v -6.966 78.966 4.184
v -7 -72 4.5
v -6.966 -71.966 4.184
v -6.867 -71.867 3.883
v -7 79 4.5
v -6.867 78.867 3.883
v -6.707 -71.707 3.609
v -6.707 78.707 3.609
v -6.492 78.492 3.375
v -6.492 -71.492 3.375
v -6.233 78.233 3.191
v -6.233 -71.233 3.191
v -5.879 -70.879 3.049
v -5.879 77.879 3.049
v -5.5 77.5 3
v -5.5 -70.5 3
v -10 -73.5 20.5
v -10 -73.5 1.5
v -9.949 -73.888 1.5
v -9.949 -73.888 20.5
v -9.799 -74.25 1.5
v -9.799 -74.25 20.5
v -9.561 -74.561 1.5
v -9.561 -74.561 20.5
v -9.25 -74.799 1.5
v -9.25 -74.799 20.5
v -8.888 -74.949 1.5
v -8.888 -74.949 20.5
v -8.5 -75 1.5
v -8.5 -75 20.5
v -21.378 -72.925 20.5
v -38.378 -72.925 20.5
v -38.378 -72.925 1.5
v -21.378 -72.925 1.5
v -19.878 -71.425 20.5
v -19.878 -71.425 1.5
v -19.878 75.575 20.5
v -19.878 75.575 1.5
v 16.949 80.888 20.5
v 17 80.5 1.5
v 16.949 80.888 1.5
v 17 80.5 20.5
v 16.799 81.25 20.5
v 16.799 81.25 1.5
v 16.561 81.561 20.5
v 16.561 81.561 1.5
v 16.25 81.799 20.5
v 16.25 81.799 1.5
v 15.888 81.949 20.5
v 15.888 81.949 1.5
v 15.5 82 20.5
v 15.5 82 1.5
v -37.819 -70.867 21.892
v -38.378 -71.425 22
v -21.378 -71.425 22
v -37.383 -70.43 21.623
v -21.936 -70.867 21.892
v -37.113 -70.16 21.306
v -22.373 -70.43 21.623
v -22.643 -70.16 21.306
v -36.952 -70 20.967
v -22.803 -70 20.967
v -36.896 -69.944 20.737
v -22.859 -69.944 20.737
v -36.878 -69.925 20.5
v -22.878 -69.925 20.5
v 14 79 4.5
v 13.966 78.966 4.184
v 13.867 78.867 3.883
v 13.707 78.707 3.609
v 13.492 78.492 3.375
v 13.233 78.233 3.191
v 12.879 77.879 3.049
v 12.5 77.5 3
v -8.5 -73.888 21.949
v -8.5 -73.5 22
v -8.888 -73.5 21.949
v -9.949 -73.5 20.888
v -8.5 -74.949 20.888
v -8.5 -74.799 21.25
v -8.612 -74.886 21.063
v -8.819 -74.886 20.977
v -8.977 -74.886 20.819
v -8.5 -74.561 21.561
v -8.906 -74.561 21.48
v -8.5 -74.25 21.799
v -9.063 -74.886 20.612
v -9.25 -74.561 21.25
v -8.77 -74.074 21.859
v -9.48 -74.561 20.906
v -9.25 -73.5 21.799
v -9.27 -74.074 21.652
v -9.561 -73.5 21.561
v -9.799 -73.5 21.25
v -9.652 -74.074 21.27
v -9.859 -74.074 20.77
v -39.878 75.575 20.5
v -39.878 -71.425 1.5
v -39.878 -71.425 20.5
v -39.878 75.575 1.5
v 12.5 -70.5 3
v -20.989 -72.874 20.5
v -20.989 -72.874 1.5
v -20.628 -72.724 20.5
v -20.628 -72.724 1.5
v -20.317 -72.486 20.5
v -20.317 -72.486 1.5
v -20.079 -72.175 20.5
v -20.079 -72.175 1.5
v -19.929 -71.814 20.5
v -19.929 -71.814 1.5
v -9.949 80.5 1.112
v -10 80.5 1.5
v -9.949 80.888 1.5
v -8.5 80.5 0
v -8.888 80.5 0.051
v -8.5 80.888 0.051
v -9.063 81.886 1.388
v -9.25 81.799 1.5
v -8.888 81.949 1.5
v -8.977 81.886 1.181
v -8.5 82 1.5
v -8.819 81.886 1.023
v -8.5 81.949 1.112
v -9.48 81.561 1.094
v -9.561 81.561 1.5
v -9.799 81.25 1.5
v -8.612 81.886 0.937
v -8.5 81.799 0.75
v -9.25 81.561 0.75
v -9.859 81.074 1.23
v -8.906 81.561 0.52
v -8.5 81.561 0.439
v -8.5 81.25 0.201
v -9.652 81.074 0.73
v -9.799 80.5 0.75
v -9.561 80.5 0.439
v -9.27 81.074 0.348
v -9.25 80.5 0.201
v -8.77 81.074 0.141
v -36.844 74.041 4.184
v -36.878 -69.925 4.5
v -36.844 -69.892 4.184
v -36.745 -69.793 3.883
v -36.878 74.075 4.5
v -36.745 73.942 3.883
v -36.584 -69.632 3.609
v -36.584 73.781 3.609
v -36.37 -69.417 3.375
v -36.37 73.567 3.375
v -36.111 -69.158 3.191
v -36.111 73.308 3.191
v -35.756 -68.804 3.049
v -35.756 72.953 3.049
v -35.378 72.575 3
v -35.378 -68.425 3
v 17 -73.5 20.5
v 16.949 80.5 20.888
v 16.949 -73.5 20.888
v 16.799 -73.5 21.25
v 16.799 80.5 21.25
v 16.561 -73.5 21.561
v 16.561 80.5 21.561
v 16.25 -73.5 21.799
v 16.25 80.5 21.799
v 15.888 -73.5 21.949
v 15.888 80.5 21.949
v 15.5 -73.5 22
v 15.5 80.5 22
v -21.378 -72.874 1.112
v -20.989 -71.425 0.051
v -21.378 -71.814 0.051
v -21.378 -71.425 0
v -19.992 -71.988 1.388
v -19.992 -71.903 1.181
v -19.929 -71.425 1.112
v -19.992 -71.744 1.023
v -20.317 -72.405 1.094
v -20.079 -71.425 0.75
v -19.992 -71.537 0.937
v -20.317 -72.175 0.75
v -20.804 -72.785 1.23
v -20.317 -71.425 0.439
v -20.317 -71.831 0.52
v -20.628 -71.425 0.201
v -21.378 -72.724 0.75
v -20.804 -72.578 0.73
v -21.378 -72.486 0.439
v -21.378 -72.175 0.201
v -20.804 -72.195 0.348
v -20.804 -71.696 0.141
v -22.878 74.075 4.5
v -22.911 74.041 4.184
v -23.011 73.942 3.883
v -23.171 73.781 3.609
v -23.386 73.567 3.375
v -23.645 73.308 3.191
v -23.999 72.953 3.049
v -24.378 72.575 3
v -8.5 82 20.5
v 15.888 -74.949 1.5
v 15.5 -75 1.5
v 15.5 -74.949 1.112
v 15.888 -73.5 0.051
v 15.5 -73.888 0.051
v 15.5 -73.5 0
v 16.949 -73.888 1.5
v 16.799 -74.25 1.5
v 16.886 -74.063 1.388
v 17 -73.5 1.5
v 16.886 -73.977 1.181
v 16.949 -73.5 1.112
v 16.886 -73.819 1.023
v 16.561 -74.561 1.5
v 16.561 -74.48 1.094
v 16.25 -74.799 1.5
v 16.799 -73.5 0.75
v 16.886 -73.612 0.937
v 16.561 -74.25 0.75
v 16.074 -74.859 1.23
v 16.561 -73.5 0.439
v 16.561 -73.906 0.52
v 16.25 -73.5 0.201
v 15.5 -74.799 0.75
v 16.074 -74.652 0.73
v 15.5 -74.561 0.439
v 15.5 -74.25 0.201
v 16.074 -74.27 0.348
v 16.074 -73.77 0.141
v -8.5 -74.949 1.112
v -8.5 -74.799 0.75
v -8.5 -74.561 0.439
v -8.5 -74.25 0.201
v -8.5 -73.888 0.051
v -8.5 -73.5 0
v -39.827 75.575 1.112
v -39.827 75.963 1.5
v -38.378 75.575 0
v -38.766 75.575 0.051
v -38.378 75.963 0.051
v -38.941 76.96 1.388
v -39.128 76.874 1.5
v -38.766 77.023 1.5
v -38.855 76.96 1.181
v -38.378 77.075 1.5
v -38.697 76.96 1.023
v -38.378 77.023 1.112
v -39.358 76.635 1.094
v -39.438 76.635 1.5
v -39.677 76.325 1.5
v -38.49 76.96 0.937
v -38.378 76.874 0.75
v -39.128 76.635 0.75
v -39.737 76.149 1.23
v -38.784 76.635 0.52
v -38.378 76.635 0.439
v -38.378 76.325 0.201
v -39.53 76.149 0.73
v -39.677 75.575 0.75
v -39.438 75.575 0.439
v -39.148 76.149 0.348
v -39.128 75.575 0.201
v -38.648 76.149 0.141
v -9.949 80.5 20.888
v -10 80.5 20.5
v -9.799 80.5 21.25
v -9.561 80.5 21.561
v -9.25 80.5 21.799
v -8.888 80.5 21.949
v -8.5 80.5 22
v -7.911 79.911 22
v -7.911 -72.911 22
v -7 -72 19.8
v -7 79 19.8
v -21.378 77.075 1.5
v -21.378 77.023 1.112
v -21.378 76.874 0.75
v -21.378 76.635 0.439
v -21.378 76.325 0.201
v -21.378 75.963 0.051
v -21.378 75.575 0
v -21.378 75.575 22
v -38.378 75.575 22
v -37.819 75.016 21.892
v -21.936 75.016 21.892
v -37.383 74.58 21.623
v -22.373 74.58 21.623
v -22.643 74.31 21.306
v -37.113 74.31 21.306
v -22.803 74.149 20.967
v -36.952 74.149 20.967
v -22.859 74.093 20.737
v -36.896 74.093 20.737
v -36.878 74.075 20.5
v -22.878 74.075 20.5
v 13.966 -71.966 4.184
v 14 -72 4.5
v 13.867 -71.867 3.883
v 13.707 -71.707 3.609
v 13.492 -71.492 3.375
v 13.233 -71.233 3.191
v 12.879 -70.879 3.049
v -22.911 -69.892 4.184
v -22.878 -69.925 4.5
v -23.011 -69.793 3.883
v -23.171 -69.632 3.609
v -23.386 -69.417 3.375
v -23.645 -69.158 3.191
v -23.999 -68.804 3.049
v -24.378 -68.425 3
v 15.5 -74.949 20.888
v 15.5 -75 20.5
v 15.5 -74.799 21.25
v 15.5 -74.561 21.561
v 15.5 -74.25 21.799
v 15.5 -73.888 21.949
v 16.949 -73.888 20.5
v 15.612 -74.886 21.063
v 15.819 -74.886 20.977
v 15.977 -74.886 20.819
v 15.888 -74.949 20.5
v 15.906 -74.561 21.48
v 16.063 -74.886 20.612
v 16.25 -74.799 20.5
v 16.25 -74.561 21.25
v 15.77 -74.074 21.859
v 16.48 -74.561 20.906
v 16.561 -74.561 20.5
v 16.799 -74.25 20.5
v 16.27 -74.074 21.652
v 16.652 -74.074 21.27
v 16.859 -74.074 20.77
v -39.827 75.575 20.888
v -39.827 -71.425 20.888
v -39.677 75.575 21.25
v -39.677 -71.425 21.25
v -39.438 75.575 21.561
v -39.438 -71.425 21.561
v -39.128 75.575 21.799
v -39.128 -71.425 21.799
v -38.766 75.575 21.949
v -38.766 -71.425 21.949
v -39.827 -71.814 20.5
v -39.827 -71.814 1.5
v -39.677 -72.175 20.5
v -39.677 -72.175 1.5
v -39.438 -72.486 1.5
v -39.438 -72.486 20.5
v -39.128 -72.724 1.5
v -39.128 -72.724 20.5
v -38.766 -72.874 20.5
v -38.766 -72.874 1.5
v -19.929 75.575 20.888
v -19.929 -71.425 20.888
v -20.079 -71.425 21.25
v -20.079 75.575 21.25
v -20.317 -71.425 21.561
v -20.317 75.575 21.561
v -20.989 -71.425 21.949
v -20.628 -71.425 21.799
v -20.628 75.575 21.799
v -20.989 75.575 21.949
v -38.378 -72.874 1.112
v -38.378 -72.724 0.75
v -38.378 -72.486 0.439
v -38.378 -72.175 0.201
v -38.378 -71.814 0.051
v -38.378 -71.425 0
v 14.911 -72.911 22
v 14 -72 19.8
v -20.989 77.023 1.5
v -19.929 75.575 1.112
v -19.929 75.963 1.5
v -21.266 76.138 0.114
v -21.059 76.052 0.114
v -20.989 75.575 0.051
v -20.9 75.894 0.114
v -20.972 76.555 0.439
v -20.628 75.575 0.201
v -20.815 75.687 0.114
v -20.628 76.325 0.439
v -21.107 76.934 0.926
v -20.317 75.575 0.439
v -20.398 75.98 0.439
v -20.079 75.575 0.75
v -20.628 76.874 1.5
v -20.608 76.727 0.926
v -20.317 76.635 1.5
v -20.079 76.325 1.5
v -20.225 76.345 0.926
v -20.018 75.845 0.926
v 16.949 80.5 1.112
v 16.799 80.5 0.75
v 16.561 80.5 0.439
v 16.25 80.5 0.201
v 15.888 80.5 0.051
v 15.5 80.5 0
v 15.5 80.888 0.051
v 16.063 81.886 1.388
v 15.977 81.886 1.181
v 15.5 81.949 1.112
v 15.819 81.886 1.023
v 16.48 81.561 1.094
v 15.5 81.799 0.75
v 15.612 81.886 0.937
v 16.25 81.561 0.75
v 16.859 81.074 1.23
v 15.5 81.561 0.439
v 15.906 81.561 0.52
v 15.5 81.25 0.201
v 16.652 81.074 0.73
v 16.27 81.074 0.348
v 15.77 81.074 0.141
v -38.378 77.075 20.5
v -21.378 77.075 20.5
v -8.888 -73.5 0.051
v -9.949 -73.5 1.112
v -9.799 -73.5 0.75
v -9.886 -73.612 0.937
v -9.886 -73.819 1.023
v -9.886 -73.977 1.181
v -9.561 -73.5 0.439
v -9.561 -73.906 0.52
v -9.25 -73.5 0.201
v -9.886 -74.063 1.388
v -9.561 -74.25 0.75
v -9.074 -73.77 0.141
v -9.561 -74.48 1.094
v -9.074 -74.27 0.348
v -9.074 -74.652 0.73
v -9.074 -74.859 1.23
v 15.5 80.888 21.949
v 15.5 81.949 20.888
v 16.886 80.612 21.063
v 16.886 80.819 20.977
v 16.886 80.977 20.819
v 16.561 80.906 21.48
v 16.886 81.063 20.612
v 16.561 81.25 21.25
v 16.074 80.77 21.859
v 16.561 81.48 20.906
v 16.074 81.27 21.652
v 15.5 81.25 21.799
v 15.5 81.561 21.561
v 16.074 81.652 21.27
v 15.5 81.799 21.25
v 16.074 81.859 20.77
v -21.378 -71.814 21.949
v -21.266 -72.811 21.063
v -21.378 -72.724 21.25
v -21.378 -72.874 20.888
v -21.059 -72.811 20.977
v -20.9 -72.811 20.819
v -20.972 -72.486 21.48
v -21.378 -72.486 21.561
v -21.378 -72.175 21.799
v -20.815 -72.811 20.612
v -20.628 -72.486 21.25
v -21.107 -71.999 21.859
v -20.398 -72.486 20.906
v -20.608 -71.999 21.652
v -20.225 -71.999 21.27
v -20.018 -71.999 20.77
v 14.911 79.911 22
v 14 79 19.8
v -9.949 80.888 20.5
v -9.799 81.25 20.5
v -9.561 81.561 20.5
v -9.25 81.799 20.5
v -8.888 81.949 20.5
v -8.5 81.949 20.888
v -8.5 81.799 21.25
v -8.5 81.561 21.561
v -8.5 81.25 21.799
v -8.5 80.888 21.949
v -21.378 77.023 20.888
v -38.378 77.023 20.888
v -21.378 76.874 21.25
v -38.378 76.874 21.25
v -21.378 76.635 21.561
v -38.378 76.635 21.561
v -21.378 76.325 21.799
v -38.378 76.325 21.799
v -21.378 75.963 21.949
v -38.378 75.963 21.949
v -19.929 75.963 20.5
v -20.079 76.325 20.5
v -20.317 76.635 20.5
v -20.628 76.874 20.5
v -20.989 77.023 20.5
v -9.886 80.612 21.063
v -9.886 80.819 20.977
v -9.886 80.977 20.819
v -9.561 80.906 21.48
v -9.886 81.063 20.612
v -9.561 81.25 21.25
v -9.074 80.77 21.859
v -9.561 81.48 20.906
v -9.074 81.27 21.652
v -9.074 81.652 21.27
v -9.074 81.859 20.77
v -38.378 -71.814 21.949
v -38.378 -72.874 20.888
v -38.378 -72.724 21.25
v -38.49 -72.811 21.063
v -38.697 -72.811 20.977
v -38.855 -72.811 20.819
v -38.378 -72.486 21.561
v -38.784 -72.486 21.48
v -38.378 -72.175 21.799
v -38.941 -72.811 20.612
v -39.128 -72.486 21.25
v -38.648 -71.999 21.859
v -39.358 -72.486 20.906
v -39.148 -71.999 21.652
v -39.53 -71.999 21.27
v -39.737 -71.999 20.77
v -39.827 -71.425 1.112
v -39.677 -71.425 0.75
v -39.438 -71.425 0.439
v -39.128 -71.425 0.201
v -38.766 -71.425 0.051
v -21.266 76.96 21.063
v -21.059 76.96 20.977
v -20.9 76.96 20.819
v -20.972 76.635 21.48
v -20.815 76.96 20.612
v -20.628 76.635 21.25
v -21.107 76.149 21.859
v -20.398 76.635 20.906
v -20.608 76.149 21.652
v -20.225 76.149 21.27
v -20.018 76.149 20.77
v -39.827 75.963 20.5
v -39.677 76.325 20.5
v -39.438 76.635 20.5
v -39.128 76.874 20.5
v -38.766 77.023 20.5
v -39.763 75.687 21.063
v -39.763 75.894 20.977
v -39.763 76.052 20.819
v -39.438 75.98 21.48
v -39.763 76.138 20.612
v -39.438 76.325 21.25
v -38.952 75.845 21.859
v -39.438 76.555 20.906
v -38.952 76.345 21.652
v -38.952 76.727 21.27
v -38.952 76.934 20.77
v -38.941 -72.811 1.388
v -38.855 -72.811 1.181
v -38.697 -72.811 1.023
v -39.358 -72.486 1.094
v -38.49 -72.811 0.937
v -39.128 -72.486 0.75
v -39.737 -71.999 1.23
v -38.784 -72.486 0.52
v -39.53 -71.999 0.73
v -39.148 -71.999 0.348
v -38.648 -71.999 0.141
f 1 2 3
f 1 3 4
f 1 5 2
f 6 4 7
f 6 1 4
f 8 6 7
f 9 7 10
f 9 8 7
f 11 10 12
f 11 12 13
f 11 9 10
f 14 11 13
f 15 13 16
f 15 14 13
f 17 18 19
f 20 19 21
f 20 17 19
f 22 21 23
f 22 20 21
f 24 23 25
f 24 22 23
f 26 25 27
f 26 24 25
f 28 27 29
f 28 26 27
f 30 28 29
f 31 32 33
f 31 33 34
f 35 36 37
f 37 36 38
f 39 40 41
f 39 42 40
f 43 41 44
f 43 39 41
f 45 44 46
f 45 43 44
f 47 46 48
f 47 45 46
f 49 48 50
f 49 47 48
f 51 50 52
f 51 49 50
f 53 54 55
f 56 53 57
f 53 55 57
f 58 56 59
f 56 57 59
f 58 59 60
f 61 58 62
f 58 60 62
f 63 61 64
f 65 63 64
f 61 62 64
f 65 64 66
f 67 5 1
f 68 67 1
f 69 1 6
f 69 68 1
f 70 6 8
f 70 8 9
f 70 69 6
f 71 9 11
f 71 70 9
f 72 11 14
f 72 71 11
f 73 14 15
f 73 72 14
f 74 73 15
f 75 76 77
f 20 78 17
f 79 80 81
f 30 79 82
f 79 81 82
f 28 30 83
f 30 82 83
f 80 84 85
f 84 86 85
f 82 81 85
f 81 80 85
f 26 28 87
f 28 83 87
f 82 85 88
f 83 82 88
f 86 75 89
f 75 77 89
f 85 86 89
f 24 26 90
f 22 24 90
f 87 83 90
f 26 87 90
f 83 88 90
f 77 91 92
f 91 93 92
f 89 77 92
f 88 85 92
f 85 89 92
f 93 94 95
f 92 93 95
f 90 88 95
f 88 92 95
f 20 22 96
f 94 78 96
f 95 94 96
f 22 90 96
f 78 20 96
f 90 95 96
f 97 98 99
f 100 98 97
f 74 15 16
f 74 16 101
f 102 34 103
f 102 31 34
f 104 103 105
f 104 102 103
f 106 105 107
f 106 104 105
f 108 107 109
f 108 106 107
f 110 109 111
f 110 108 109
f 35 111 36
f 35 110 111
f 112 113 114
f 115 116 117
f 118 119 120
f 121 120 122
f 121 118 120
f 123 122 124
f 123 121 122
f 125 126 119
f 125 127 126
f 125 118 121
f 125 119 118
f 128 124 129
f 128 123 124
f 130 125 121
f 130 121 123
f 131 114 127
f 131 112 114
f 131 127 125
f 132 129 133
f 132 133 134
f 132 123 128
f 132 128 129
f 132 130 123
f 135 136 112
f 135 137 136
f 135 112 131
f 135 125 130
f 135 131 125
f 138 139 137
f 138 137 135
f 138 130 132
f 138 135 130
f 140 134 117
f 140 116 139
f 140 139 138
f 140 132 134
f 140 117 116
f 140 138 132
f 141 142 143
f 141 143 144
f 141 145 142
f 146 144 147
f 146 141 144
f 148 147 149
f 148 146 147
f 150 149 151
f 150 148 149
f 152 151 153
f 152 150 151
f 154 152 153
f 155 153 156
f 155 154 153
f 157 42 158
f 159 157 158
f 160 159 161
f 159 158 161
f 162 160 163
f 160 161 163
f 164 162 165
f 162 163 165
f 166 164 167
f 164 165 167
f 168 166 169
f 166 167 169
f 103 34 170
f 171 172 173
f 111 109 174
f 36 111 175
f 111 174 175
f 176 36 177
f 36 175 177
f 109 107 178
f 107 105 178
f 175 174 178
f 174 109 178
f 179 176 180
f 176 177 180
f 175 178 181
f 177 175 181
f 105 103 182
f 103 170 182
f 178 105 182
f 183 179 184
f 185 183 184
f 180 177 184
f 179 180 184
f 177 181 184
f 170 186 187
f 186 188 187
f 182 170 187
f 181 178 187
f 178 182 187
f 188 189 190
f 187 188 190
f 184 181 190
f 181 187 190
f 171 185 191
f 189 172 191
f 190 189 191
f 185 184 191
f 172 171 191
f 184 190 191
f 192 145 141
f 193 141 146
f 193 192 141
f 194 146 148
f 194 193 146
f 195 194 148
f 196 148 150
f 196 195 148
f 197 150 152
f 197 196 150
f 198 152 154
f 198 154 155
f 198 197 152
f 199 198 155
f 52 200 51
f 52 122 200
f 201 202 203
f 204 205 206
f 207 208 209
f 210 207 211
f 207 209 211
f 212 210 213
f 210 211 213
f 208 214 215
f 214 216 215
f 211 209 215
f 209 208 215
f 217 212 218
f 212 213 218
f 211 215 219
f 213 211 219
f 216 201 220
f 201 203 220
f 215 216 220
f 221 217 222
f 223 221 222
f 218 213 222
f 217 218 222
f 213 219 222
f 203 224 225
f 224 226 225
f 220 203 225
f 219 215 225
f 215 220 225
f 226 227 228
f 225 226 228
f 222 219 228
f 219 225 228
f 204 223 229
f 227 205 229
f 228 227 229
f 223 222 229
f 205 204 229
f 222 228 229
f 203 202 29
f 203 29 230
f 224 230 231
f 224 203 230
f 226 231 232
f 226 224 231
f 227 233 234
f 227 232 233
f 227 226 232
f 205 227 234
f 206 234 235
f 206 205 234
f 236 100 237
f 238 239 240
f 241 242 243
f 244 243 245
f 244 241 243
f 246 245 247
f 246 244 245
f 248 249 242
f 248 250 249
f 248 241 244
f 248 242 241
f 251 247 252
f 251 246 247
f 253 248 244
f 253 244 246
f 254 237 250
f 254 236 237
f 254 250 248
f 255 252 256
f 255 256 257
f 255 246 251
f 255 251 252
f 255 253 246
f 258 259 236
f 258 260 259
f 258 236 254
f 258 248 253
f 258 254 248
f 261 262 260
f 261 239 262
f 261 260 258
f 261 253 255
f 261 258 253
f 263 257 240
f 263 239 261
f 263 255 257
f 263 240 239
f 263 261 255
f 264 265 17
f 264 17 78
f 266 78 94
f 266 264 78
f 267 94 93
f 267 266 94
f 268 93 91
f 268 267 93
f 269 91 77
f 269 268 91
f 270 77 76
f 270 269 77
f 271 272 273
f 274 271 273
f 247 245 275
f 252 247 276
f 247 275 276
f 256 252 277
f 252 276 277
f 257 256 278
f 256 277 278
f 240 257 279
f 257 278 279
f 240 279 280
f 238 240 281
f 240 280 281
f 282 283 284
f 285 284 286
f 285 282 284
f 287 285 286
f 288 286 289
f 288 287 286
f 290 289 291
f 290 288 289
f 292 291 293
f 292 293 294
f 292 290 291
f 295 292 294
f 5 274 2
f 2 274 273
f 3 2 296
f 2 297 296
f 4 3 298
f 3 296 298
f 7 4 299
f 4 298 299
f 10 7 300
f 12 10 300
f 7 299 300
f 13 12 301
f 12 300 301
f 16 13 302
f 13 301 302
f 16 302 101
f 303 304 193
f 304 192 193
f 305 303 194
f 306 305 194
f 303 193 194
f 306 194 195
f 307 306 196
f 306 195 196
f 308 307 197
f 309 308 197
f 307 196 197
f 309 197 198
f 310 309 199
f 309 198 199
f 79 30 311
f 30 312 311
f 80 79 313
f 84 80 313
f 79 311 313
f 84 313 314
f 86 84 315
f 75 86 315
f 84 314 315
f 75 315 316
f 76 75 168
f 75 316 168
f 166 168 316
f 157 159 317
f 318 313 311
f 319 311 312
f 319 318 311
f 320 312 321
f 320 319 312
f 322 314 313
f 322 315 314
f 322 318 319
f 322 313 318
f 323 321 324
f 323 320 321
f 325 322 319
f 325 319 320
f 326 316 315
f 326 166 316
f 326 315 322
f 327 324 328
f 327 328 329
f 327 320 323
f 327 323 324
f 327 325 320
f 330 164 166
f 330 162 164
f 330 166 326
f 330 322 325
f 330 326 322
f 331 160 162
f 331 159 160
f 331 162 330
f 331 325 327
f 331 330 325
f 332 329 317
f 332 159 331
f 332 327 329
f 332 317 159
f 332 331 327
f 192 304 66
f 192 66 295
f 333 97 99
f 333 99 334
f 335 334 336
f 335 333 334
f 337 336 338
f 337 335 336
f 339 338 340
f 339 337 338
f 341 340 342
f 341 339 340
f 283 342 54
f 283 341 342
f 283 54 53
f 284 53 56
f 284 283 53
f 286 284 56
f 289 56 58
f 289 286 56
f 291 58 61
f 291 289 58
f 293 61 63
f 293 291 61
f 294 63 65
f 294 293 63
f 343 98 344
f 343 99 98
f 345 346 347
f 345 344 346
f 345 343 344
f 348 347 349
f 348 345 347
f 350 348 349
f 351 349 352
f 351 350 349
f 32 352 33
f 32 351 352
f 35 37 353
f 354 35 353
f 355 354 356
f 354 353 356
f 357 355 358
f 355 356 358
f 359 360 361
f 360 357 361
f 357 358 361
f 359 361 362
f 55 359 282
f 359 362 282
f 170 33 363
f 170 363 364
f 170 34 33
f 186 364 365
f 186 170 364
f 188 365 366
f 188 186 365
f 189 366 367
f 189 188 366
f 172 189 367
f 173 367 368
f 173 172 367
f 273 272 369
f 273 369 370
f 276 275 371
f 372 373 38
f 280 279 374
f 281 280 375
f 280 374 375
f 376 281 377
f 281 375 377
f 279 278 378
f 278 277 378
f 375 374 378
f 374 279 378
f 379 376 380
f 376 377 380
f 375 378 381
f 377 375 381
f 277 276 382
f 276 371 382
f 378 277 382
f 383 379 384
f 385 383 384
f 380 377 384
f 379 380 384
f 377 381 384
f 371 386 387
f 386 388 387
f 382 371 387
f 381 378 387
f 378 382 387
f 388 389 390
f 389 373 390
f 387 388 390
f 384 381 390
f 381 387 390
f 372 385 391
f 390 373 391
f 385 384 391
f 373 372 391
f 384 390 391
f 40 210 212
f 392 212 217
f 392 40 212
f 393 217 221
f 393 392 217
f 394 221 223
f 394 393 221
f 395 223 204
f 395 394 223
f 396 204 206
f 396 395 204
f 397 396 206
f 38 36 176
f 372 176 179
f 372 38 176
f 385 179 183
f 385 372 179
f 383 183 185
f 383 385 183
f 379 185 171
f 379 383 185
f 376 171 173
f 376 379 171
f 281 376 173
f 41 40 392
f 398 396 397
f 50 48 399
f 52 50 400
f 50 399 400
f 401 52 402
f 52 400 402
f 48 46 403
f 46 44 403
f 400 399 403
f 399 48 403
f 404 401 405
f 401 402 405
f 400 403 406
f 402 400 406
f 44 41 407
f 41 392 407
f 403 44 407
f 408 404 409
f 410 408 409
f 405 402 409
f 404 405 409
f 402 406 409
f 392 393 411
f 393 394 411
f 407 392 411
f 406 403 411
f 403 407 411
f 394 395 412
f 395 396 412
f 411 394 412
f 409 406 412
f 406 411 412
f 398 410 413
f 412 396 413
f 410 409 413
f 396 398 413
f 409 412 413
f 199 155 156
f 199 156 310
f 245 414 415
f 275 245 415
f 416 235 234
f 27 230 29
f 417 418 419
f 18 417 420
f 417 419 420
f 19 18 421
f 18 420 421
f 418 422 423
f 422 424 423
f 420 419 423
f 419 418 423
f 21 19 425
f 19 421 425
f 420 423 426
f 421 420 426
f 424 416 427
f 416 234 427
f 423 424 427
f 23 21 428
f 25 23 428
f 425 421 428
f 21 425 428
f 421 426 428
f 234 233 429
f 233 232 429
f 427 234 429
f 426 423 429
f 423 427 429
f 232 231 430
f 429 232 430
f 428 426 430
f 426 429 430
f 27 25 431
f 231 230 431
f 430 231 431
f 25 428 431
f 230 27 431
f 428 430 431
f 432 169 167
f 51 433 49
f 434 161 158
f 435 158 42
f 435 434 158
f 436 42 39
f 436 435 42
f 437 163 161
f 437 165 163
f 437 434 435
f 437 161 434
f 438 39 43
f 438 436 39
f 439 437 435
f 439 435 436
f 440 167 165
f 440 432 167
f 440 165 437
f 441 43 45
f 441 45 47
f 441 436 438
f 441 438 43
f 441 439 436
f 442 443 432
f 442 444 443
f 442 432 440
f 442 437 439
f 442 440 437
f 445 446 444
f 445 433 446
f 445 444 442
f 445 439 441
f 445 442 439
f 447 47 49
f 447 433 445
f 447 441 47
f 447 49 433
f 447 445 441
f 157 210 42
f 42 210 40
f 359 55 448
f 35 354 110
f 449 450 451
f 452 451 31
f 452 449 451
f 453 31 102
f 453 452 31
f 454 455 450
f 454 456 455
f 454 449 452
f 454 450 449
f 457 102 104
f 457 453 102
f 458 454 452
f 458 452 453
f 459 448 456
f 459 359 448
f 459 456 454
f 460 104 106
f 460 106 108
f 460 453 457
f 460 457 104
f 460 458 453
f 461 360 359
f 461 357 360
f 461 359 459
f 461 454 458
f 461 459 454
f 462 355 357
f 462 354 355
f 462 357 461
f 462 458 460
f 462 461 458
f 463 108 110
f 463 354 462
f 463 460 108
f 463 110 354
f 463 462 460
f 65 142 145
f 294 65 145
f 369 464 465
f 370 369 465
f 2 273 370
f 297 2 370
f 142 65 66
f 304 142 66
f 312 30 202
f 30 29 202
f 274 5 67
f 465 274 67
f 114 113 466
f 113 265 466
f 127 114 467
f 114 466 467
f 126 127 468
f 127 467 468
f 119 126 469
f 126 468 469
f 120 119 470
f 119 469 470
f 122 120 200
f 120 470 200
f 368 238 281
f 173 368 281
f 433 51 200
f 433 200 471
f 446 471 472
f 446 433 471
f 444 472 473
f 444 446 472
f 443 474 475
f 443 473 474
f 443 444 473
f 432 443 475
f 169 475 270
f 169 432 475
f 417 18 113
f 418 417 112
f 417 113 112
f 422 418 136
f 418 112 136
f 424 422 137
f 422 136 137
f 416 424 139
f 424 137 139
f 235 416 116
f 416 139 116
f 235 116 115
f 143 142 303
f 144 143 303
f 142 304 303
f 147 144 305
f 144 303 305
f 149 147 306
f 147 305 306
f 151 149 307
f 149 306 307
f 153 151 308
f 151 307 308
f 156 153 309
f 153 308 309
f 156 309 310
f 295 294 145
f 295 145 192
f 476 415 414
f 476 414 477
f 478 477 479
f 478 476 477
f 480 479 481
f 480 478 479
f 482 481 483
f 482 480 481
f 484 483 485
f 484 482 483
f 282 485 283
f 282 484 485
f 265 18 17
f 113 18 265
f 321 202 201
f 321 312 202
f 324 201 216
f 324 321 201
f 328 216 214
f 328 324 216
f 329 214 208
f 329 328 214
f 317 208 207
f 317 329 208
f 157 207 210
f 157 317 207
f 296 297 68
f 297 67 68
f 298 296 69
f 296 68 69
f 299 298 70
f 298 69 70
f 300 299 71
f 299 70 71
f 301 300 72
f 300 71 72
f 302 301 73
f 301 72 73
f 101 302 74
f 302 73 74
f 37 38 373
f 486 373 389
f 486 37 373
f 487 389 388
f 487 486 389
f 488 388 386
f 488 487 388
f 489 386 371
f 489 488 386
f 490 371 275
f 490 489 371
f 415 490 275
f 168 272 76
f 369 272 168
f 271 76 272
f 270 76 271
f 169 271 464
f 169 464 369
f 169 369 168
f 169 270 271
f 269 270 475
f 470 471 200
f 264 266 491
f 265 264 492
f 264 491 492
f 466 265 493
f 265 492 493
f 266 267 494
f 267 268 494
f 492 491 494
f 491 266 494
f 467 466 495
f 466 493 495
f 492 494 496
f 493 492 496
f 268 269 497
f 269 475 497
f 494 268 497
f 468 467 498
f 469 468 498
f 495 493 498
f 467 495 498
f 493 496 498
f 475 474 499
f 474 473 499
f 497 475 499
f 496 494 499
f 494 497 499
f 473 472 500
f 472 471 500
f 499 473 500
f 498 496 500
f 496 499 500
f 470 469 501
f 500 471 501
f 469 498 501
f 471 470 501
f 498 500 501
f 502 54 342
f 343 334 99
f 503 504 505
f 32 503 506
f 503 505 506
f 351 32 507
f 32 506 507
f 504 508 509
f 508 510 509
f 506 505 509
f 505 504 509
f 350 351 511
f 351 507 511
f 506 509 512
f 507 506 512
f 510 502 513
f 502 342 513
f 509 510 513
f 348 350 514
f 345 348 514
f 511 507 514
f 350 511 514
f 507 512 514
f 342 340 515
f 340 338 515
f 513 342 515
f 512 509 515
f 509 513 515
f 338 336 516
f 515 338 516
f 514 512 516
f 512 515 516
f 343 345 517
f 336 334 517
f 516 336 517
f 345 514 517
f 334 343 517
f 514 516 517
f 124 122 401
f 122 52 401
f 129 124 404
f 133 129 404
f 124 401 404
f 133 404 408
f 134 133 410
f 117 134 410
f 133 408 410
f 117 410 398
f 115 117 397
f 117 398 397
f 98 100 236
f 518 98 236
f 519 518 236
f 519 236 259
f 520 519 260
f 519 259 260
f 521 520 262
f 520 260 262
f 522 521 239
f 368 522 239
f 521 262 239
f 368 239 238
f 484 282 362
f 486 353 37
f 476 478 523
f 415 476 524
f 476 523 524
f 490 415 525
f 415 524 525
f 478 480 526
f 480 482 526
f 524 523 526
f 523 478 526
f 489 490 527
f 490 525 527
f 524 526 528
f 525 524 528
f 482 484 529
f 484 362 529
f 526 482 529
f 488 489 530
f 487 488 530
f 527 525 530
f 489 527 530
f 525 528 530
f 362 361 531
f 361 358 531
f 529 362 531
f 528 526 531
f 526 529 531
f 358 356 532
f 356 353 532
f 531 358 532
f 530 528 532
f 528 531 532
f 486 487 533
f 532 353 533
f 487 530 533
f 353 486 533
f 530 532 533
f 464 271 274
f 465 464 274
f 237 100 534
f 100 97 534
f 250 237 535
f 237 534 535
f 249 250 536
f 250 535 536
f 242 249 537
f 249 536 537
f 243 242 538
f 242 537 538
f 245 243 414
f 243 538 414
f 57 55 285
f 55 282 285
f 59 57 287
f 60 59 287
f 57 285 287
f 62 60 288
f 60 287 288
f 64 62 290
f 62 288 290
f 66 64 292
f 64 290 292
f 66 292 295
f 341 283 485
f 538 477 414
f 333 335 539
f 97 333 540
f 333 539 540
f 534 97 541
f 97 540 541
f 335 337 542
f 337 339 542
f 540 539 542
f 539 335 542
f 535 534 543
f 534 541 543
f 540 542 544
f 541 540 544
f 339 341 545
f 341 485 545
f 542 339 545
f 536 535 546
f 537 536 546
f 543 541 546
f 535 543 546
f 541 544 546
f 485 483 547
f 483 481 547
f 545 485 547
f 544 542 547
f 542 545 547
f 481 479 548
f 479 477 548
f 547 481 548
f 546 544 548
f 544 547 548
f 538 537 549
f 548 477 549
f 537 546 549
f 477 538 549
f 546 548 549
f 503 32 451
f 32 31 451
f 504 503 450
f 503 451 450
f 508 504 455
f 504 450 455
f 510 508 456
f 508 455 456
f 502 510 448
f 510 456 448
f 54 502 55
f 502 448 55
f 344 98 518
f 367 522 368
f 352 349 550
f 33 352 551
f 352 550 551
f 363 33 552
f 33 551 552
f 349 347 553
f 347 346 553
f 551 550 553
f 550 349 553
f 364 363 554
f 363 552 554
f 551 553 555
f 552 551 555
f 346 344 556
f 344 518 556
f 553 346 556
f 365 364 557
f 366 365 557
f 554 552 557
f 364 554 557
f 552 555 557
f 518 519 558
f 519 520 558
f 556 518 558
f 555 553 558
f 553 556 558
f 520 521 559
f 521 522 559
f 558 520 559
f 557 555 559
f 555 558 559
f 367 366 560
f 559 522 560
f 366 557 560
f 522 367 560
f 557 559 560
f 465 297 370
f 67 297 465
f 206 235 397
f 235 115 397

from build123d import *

# Parameters (mm, degrees)
F0_W          = 20
F0_H          = 150
F1_DEPTH      = 22
F2_T          = -3
F3_W          = 27
F3_H          = 157
F4_DEPTH      = 22
F5_T          = -3
F6_R          = 1.49999
F6_2_R        = 1.49999
F7_SIZE       = 0.9
F8_T4_DEPTH   = 21
F8_T9_DEPTH   = 24.3704715108
F8_T15_DEPTH  = 21
F8_T21_DEPTH  = 21
F8_T26_DEPTH  = 24.3704715108
F8_T32_DEPTH  = 151
F8_T37_DEPTH  = 154.3704715108
F8_T43_DEPTH  = 151
F8_T49_DEPTH  = 151
F8_T54_DEPTH  = 154.3704715108
F8_T60_DEPTH  = 151
F8_T65_DEPTH  = 154.3704715108
F8_T71_DEPTH  = 151
F8_T77_DEPTH  = 151
F8_T82_DEPTH  = 154.3704715108
F8_T88_DEPTH  = 21
F8_T93_DEPTH  = 24.3704715108
F8_T99_DEPTH  = 21
F8_T105_DEPTH = 21
F8_T110_DEPTH = 24.3704715108
F8_T117_DEPTH = 24.3704715108
F8_T122_DEPTH = 154.3704715108
F8_T130_DEPTH = 24.3704715108
F8_T135_DEPTH = 154.3704715108
F8_T143_DEPTH = 154.3704715108
F8_T148_DEPTH = 24.3704715108
F8_T156_DEPTH = 154.3704715108
F8_T161_DEPTH = 24.3704715108


# Not quite as in the source:
# - a fillet or chamfer that OpenCascade refuses, or shapes differently, is made with other operations: its cross-section is extruded or revolved along the edge and cut away or added
# - a fillet or chamfer is up to 0.001 mm smaller than in the source, because OpenCascade refuses the exact size


with BuildPart() as f1:
    # F0 (on Top) → F1 (new body)
    with BuildSketch(Plane.XY):
        with Locations((-29.877627335, 2.0745843649)):
            Rectangle(F0_W, F0_H)
    extrude(amount=F1_DEPTH)

    # F2
    f2_openings = [f1.faces().sort_by_distance(p)[0] for p in [
        (-29.877627, 2.074584, 22),
    ]]
    offset(amount=F2_T, openings=f2_openings)

    # F6 (radius 1.5 in the source; OpenCascade refuses exactly that, so slightly less here)
    f6_edges = [f1.edges().sort_by_distance(p)[0] for p in [
        (-19.877627, 2.074584, 22),
        (-22.877627, 2.074584, 22),
        (-29.877627, 77.074584, 22),
        (-29.877627, 74.074584, 22),
        (-39.877627, 2.074584, 22),
        (-36.877627, 2.074584, 22),
        (-29.877627, -69.925416, 22),
        (-29.877627, -72.925416, 22),
        (-39.877627, 2.074584, 0),
        (-39.877627, -72.925416, 11),
        (-29.877627, -72.925416, 0),
        (-19.877627, -72.925416, 11),
        (-19.877627, 77.074584, 11),
        (-39.877627, 77.074584, 11),
        (-29.877627, 77.074584, 0),
        (-19.877627, 2.074584, 0),
        (-36.877627, 2.074584, 3),
        (-29.877627, -69.925416, 3),
        (-29.877627, 74.074584, 3),
        (-22.877627, 2.074584, 3),
    ]]
    fillet(f6_edges, radius=F6_R)


with BuildPart() as f4:
    # F3 (on Top) → F4 (new body)
    with BuildSketch(Plane.XY):
        with Locations((3.5, 3.5)):
            Rectangle(F3_W, F3_H)
    extrude(amount=F4_DEPTH)

    # F5
    f5_openings = [f4.faces().sort_by_distance(p)[0] for p in [
        (3.5, 3.5, 22),
    ]]
    offset(amount=F5_T, openings=f5_openings)

    # F6#2 (radius 1.5 in the source; OpenCascade refuses exactly that, so slightly less here)
    f6_2_edges = [f4.edges().sort_by_distance(p)[0] for p in [
        (3.5, 82, 22),
        (-10, 3.5, 22),
        (17, 3.5, 22),
        (3.5, -75, 22),
        (3.5, -75, 0),
        (17, -75, 11),
        (17, 3.5, 0),
        (-10, 3.5, 0),
        (-10, -75, 11),
        (-10, 82, 11),
        (17, 82, 11),
        (3.5, 82, 0),
        (3.5, 79, 3),
        (14, 3.5, 3),
        (-7, 3.5, 3),
        (3.5, -72, 3),
    ]]
    fillet(f6_2_edges, radius=F6_2_R)

    # F7
    f7_edges = [f4.edges().sort_by_distance(p)[0] for p in [
        (3.5, 79, 22),
        (-7, 3.5, 22),
        (14, 3.5, 22),
        (3.5, -72, 22),
    ]]
    chamfer(f7_edges, length=F7_SIZE)

    # F8: chamfer of 1.3 on 4 edges, made by hand


with BuildPart() as f8_tool2:
    # F8_s3 → F8_t4 (new body)
    with BuildSketch(Plane.YZ.offset(14)):
        Polygon((79.9192388155, 22.0192388155), (79, 19.8), (79, 21.1), align=None)
    extrude(amount=-F8_T4_DEPTH)

    split(bisect_by=Plane(origin=(-3.55, 0, 3.55), x_dir=(0, 1, 0), z_dir=(0.7071067812, 0, -0.7071067812)), keep=Keep.TOP)


with BuildPart() as f4_1:
    add(f4.part)

    # F8_t1: cut F8_tool2
    add(f8_tool2.part, mode=Mode.SUBTRACT)


with BuildPart() as f8_tool7:
    # F8_s8 → F8_t9 (new body)
    with BuildSketch(Plane.YZ.offset(17.3704715108)):
        Polygon((79.9192388155, 22.0192388155), (79, 19.8), (79, 21.1), align=None)
    extrude(amount=-F8_T9_DEPTH)

    split(bisect_by=Plane(origin=(-3.55, 0, 3.55), x_dir=(0, 1, 0), z_dir=(-0.7071067812, 0, 0.7071067812)), keep=Keep.TOP)

    split(bisect_by=Plane.YZ.offset(14), keep=Keep.TOP)


with BuildPart() as f4_2:
    add(f4_1.part)

    # F8_t6: cut F8_tool7
    add(f8_tool7.part, mode=Mode.SUBTRACT)


with BuildPart() as f8_tool13:
    # F8_s14 → F8_t15 (new body)
    with BuildSketch(Plane.YZ.offset(14)):
        Polygon((79.9192388155, 22.0192388155), (79, 19.8), (79, 21.1), align=None)
    extrude(amount=-F8_T15_DEPTH)

    split(bisect_by=Plane(origin=(-3.55, 0, 3.55), x_dir=(0, 1, 0), z_dir=(-0.7071067812, 0, 0.7071067812)), keep=Keep.TOP)

    split(bisect_by=Plane(origin=(7.05, 0, 7.05), x_dir=(0, 1, 0), z_dir=(0.7071067812, 0, 0.7071067812)), keep=Keep.TOP)


with BuildPart() as f4_3:
    add(f4_2.part)

    # F8_t12: cut F8_tool13
    add(f8_tool13.part, mode=Mode.SUBTRACT)


with BuildPart() as f8_tool19:
    # F8_s20 → F8_t21 (new body)
    with BuildSketch(Plane.YZ.offset(14)):
        Polygon((79.9192388155, 22.0192388155), (79, 19.8), (79, 21.1), align=None)
    extrude(amount=-F8_T21_DEPTH)

    split(bisect_by=Plane(origin=(7.05, 0, 7.05), x_dir=(0, 1, 0), z_dir=(-0.7071067812, 0, -0.7071067812)), keep=Keep.TOP)


with BuildPart() as f4_4:
    add(f4_3.part)

    # F8_t18: cut F8_tool19
    add(f8_tool19.part, mode=Mode.SUBTRACT)


with BuildPart() as f8_tool24:
    # F8_s25 → F8_t26 (new body)
    with BuildSketch(Plane.YZ.offset(14)):
        Polygon((79.9192388155, 22.0192388155), (79, 19.8), (79, 21.1), align=None)
    extrude(amount=-F8_T26_DEPTH)

    split(bisect_by=Plane(origin=(7.05, 0, 7.05), x_dir=(0, 1, 0), z_dir=(0.7071067812, 0, 0.7071067812)), keep=Keep.TOP)

    split(bisect_by=Plane.YZ.offset(-7), keep=Keep.BOTTOM)


with BuildPart() as f4_5:
    add(f4_4.part)

    # F8_t23: cut F8_tool24
    add(f8_tool24.part, mode=Mode.SUBTRACT)


with BuildPart() as f8_tool30:
    # F8_s31 → F8_t32 (new body)
    with BuildSketch(Plane.XZ.offset(-79)):
        Polygon((-7.9192388155, 22.0192388155), (-7, 19.8), (-7, 21.1), align=None)
    extrude(amount=F8_T32_DEPTH)

    split(bisect_by=Plane(origin=(0, 28.95, -28.95), x_dir=(1, 0, 0), z_dir=(0, 0.7071067812, -0.7071067812)), keep=Keep.TOP)


with BuildPart() as f4_6:
    add(f4_5.part)

    # F8_t29: cut F8_tool30
    add(f8_tool30.part, mode=Mode.SUBTRACT)


with BuildPart() as f8_tool35:
    # F8_s36 → F8_t37 (new body)
    with BuildSketch(Plane.XZ.offset(-82.3704715108)):
        Polygon((-7.9192388155, 22.0192388155), (-7, 19.8), (-7, 21.1), align=None)
    extrude(amount=F8_T37_DEPTH)

    split(bisect_by=Plane(origin=(0, 28.95, -28.95), x_dir=(1, 0, 0), z_dir=(0, -0.7071067812, 0.7071067812)), keep=Keep.TOP)

    split(bisect_by=Plane.XZ.offset(-79), keep=Keep.BOTTOM)


with BuildPart() as f4_7:
    add(f4_6.part)

    # F8_t34: cut F8_tool35
    add(f8_tool35.part, mode=Mode.SUBTRACT)


with BuildPart() as f8_tool41:
    # F8_s42 → F8_t43 (new body)
    with BuildSketch(Plane.XZ.offset(-79)):
        Polygon((-7.9192388155, 22.0192388155), (-7, 19.8), (-7, 21.1), align=None)
    extrude(amount=F8_T43_DEPTH)

    split(bisect_by=Plane(origin=(0, 28.95, -28.95), x_dir=(1, 0, 0), z_dir=(0, -0.7071067812, 0.7071067812)), keep=Keep.TOP)

    split(bisect_by=Plane(origin=(0, -25.45, -25.45), x_dir=(1, 0, 0), z_dir=(0, 0.7071067812, 0.7071067812)), keep=Keep.TOP)


with BuildPart() as f4_8:
    add(f4_7.part)

    # F8_t40: cut F8_tool41
    add(f8_tool41.part, mode=Mode.SUBTRACT)


with BuildPart() as f8_tool47:
    # F8_s48 → F8_t49 (new body)
    with BuildSketch(Plane.XZ.offset(-79)):
        Polygon((-7.9192388155, 22.0192388155), (-7, 19.8), (-7, 21.1), align=None)
    extrude(amount=F8_T49_DEPTH)

    split(bisect_by=Plane(origin=(0, -25.45, -25.45), x_dir=(1, 0, 0), z_dir=(0, -0.7071067812, -0.7071067812)), keep=Keep.TOP)


with BuildPart() as f4_9:
    add(f4_8.part)

    # F8_t46: cut F8_tool47
    add(f8_tool47.part, mode=Mode.SUBTRACT)


with BuildPart() as f8_tool52:
    # F8_s53 → F8_t54 (new body)
    with BuildSketch(Plane.XZ.offset(-79)):
        Polygon((-7.9192388155, 22.0192388155), (-7, 19.8), (-7, 21.1), align=None)
    extrude(amount=F8_T54_DEPTH)

    split(bisect_by=Plane(origin=(0, -25.45, -25.45), x_dir=(1, 0, 0), z_dir=(0, 0.7071067812, 0.7071067812)), keep=Keep.TOP)

    split(bisect_by=Plane.XZ.offset(72), keep=Keep.TOP)


with BuildPart() as f4_10:
    add(f4_9.part)

    # F8_t51: cut F8_tool52
    add(f8_tool52.part, mode=Mode.SUBTRACT)


with BuildPart() as f8_tool58:
    # F8_s59 → F8_t60 (new body)
    with BuildSketch(Plane.XZ.offset(72)):
        Polygon((14.9192388155, 22.0192388155), (14, 19.8), (14, 21.1), align=None)
    extrude(amount=-F8_T60_DEPTH)

    split(bisect_by=Plane(origin=(0, -25.45, -25.45), x_dir=(1, 0, 0), z_dir=(0, -0.7071067812, -0.7071067812)), keep=Keep.TOP)


with BuildPart() as f4_11:
    add(f4_10.part)

    # F8_t57: cut F8_tool58
    add(f8_tool58.part, mode=Mode.SUBTRACT)


with BuildPart() as f8_tool63:
    # F8_s64 → F8_t65 (new body)
    with BuildSketch(Plane.XZ.offset(75.3704715108)):
        Polygon((14.9192388155, 22.0192388155), (14, 19.8), (14, 21.1), align=None)
    extrude(amount=-F8_T65_DEPTH)

    split(bisect_by=Plane(origin=(0, -25.45, -25.45), x_dir=(1, 0, 0), z_dir=(0, 0.7071067812, 0.7071067812)), keep=Keep.TOP)

    split(bisect_by=Plane.XZ.offset(72), keep=Keep.TOP)


with BuildPart() as f4_12:
    add(f4_11.part)

    # F8_t62: cut F8_tool63
    add(f8_tool63.part, mode=Mode.SUBTRACT)


with BuildPart() as f8_tool69:
    # F8_s70 → F8_t71 (new body)
    with BuildSketch(Plane.XZ.offset(72)):
        Polygon((14.9192388155, 22.0192388155), (14, 19.8), (14, 21.1), align=None)
    extrude(amount=-F8_T71_DEPTH)

    split(bisect_by=Plane(origin=(0, 28.95, -28.95), x_dir=(1, 0, 0), z_dir=(0, -0.7071067812, 0.7071067812)), keep=Keep.TOP)

    split(bisect_by=Plane(origin=(0, -25.45, -25.45), x_dir=(1, 0, 0), z_dir=(0, 0.7071067812, 0.7071067812)), keep=Keep.TOP)


with BuildPart() as f4_13:
    add(f4_12.part)

    # F8_t68: cut F8_tool69
    add(f8_tool69.part, mode=Mode.SUBTRACT)


with BuildPart() as f8_tool75:
    # F8_s76 → F8_t77 (new body)
    with BuildSketch(Plane.XZ.offset(72)):
        Polygon((14.9192388155, 22.0192388155), (14, 19.8), (14, 21.1), align=None)
    extrude(amount=-F8_T77_DEPTH)

    split(bisect_by=Plane(origin=(0, 28.95, -28.95), x_dir=(1, 0, 0), z_dir=(0, 0.7071067812, -0.7071067812)), keep=Keep.TOP)


with BuildPart() as f4_14:
    add(f4_13.part)

    # F8_t74: cut F8_tool75
    add(f8_tool75.part, mode=Mode.SUBTRACT)


with BuildPart() as f8_tool80:
    # F8_s81 → F8_t82 (new body)
    with BuildSketch(Plane.XZ.offset(72)):
        Polygon((14.9192388155, 22.0192388155), (14, 19.8), (14, 21.1), align=None)
    extrude(amount=-F8_T82_DEPTH)

    split(bisect_by=Plane(origin=(0, 28.95, -28.95), x_dir=(1, 0, 0), z_dir=(0, -0.7071067812, 0.7071067812)), keep=Keep.TOP)

    split(bisect_by=Plane.XZ.offset(-79), keep=Keep.BOTTOM)


with BuildPart() as f4_15:
    add(f4_14.part)

    # F8_t79: cut F8_tool80
    add(f8_tool80.part, mode=Mode.SUBTRACT)


with BuildPart() as f8_tool86:
    # F8_s87 → F8_t88 (new body)
    with BuildSketch(Plane.YZ.offset(-7)):
        Polygon((-72.9192388155, 22.0192388155), (-72, 19.8), (-72, 21.1), align=None)
    extrude(amount=F8_T88_DEPTH)

    split(bisect_by=Plane(origin=(7.05, 0, 7.05), x_dir=(0, 1, 0), z_dir=(-0.7071067812, 0, -0.7071067812)), keep=Keep.TOP)


with BuildPart() as f4_16:
    add(f4_15.part)

    # F8_t85: cut F8_tool86
    add(f8_tool86.part, mode=Mode.SUBTRACT)


with BuildPart() as f8_tool91:
    # F8_s92 → F8_t93 (new body)
    with BuildSketch(Plane.YZ.offset(-10.3704715108)):
        Polygon((-72.9192388155, 22.0192388155), (-72, 19.8), (-72, 21.1), align=None)
    extrude(amount=F8_T93_DEPTH)

    split(bisect_by=Plane(origin=(7.05, 0, 7.05), x_dir=(0, 1, 0), z_dir=(0.7071067812, 0, 0.7071067812)), keep=Keep.TOP)

    split(bisect_by=Plane.YZ.offset(-7), keep=Keep.BOTTOM)


with BuildPart() as f4_17:
    add(f4_16.part)

    # F8_t90: cut F8_tool91
    add(f8_tool91.part, mode=Mode.SUBTRACT)


with BuildPart() as f8_tool97:
    # F8_s98 → F8_t99 (new body)
    with BuildSketch(Plane.YZ.offset(-7)):
        Polygon((-72.9192388155, 22.0192388155), (-72, 19.8), (-72, 21.1), align=None)
    extrude(amount=F8_T99_DEPTH)

    split(bisect_by=Plane(origin=(-3.55, 0, 3.55), x_dir=(0, 1, 0), z_dir=(-0.7071067812, 0, 0.7071067812)), keep=Keep.TOP)

    split(bisect_by=Plane(origin=(7.05, 0, 7.05), x_dir=(0, 1, 0), z_dir=(0.7071067812, 0, 0.7071067812)), keep=Keep.TOP)


with BuildPart() as f4_18:
    add(f4_17.part)

    # F8_t96: cut F8_tool97
    add(f8_tool97.part, mode=Mode.SUBTRACT)


with BuildPart() as f8_tool103:
    # F8_s104 → F8_t105 (new body)
    with BuildSketch(Plane.YZ.offset(-7)):
        Polygon((-72.9192388155, 22.0192388155), (-72, 19.8), (-72, 21.1), align=None)
    extrude(amount=F8_T105_DEPTH)

    split(bisect_by=Plane(origin=(-3.55, 0, 3.55), x_dir=(0, 1, 0), z_dir=(0.7071067812, 0, -0.7071067812)), keep=Keep.TOP)


with BuildPart() as f4_19:
    add(f4_18.part)

    # F8_t102: cut F8_tool103
    add(f8_tool103.part, mode=Mode.SUBTRACT)


with BuildPart() as f8_tool108:
    # F8_s109 → F8_t110 (new body)
    with BuildSketch(Plane.YZ.offset(-7)):
        Polygon((-72.9192388155, 22.0192388155), (-72, 19.8), (-72, 21.1), align=None)
    extrude(amount=F8_T110_DEPTH)

    split(bisect_by=Plane(origin=(-3.55, 0, 3.55), x_dir=(0, 1, 0), z_dir=(-0.7071067812, 0, 0.7071067812)), keep=Keep.TOP)

    split(bisect_by=Plane.YZ.offset(14), keep=Keep.TOP)


with BuildPart() as f4_20:
    add(f4_19.part)

    # F8_t107: cut F8_tool108
    add(f8_tool108.part, mode=Mode.SUBTRACT)


with BuildPart() as f8_tool115:
    # F8_s116 → F8_t117 (new body)
    with BuildSketch(Plane.YZ.offset(17.3704715108)):
        Polygon((79.9192388155, 22.0192388155), (79, 19.8), (79, 21.1), align=None)
    extrude(amount=-F8_T117_DEPTH)

    split(bisect_by=Plane(origin=(-3.55, 0, 3.55), x_dir=(0, 1, 0), z_dir=(0.7071067812, 0, -0.7071067812)), keep=Keep.TOP)

    split(bisect_by=Plane.YZ.offset(14), keep=Keep.TOP)


with BuildPart() as f8_tool120:
    # F8_s121 → F8_t122 (new body)
    with BuildSketch(Plane.XZ.offset(72)):
        Polygon((14.9192388155, 22.0192388155), (14, 19.8), (14, 21.1), align=None)
    extrude(amount=-F8_T122_DEPTH)

    split(bisect_by=Plane(origin=(0, 28.95, -28.95), x_dir=(1, 0, 0), z_dir=(0, 0.7071067812, -0.7071067812)), keep=Keep.TOP)

    split(bisect_by=Plane.XZ.offset(-79), keep=Keep.BOTTOM)


with BuildPart() as f8_tool115_1:
    add(f8_tool115.part)

    # F8_t125: intersect F8_tool120
    add(f8_tool120.part, mode=Mode.INTERSECT)


with BuildPart() as f4_21:
    add(f4_20.part)

    # F8_t113: cut F8_tool115
    add(f8_tool115_1.part, mode=Mode.SUBTRACT)


with BuildPart() as f8_tool128:
    # F8_s129 → F8_t130 (new body)
    with BuildSketch(Plane.YZ.offset(14)):
        Polygon((79.9192388155, 22.0192388155), (79, 19.8), (79, 21.1), align=None)
    extrude(amount=-F8_T130_DEPTH)

    split(bisect_by=Plane(origin=(7.05, 0, 7.05), x_dir=(0, 1, 0), z_dir=(-0.7071067812, 0, -0.7071067812)), keep=Keep.TOP)

    split(bisect_by=Plane.YZ.offset(-7), keep=Keep.BOTTOM)


with BuildPart() as f8_tool133:
    # F8_s134 → F8_t135 (new body)
    with BuildSketch(Plane.XZ.offset(-82.3704715108)):
        Polygon((-7.9192388155, 22.0192388155), (-7, 19.8), (-7, 21.1), align=None)
    extrude(amount=F8_T135_DEPTH)

    split(bisect_by=Plane(origin=(0, 28.95, -28.95), x_dir=(1, 0, 0), z_dir=(0, 0.7071067812, -0.7071067812)), keep=Keep.TOP)

    split(bisect_by=Plane.XZ.offset(-79), keep=Keep.BOTTOM)


with BuildPart() as f8_tool128_1:
    add(f8_tool128.part)

    # F8_t138: intersect F8_tool133
    add(f8_tool133.part, mode=Mode.INTERSECT)


with BuildPart() as f4_22:
    add(f4_21.part)

    # F8_t126: cut F8_tool128
    add(f8_tool128_1.part, mode=Mode.SUBTRACT)


with BuildPart() as f8_tool141:
    # F8_s142 → F8_t143 (new body)
    with BuildSketch(Plane.XZ.offset(-79)):
        Polygon((-7.9192388155, 22.0192388155), (-7, 19.8), (-7, 21.1), align=None)
    extrude(amount=F8_T143_DEPTH)

    split(bisect_by=Plane(origin=(0, -25.45, -25.45), x_dir=(1, 0, 0), z_dir=(0, -0.7071067812, -0.7071067812)), keep=Keep.TOP)

    split(bisect_by=Plane.XZ.offset(72), keep=Keep.TOP)


with BuildPart() as f8_tool146:
    # F8_s147 → F8_t148 (new body)
    with BuildSketch(Plane.YZ.offset(-10.3704715108)):
        Polygon((-72.9192388155, 22.0192388155), (-72, 19.8), (-72, 21.1), align=None)
    extrude(amount=F8_T148_DEPTH)

    split(bisect_by=Plane(origin=(7.05, 0, 7.05), x_dir=(0, 1, 0), z_dir=(-0.7071067812, 0, -0.7071067812)), keep=Keep.TOP)

    split(bisect_by=Plane.YZ.offset(-7), keep=Keep.BOTTOM)


with BuildPart() as f8_tool141_1:
    add(f8_tool141.part)

    # F8_t151: intersect F8_tool146
    add(f8_tool146.part, mode=Mode.INTERSECT)


with BuildPart() as f4_23:
    add(f4_22.part)

    # F8_t139: cut F8_tool141
    add(f8_tool141_1.part, mode=Mode.SUBTRACT)


with BuildPart() as f8_tool154:
    # F8_s155 → F8_t156 (new body)
    with BuildSketch(Plane.XZ.offset(75.3704715108)):
        Polygon((14.9192388155, 22.0192388155), (14, 19.8), (14, 21.1), align=None)
    extrude(amount=-F8_T156_DEPTH)

    split(bisect_by=Plane(origin=(0, -25.45, -25.45), x_dir=(1, 0, 0), z_dir=(0, -0.7071067812, -0.7071067812)), keep=Keep.TOP)

    split(bisect_by=Plane.XZ.offset(72), keep=Keep.TOP)


with BuildPart() as f8_tool159:
    # F8_s160 → F8_t161 (new body)
    with BuildSketch(Plane.YZ.offset(-7)):
        Polygon((-72.9192388155, 22.0192388155), (-72, 19.8), (-72, 21.1), align=None)
    extrude(amount=F8_T161_DEPTH)

    split(bisect_by=Plane(origin=(-3.55, 0, 3.55), x_dir=(0, 1, 0), z_dir=(0.7071067812, 0, -0.7071067812)), keep=Keep.TOP)

    split(bisect_by=Plane.YZ.offset(14), keep=Keep.TOP)


with BuildPart() as f8_tool154_1:
    add(f8_tool154.part)

    # F8_t164: intersect F8_tool159
    add(f8_tool159.part, mode=Mode.INTERSECT)


with BuildPart() as f4_24:
    add(f4_23.part)

    # F8_t152: cut F8_tool154
    add(f8_tool154_1.part, mode=Mode.SUBTRACT)


solid = Compound([f1.part, f4_24.part])
